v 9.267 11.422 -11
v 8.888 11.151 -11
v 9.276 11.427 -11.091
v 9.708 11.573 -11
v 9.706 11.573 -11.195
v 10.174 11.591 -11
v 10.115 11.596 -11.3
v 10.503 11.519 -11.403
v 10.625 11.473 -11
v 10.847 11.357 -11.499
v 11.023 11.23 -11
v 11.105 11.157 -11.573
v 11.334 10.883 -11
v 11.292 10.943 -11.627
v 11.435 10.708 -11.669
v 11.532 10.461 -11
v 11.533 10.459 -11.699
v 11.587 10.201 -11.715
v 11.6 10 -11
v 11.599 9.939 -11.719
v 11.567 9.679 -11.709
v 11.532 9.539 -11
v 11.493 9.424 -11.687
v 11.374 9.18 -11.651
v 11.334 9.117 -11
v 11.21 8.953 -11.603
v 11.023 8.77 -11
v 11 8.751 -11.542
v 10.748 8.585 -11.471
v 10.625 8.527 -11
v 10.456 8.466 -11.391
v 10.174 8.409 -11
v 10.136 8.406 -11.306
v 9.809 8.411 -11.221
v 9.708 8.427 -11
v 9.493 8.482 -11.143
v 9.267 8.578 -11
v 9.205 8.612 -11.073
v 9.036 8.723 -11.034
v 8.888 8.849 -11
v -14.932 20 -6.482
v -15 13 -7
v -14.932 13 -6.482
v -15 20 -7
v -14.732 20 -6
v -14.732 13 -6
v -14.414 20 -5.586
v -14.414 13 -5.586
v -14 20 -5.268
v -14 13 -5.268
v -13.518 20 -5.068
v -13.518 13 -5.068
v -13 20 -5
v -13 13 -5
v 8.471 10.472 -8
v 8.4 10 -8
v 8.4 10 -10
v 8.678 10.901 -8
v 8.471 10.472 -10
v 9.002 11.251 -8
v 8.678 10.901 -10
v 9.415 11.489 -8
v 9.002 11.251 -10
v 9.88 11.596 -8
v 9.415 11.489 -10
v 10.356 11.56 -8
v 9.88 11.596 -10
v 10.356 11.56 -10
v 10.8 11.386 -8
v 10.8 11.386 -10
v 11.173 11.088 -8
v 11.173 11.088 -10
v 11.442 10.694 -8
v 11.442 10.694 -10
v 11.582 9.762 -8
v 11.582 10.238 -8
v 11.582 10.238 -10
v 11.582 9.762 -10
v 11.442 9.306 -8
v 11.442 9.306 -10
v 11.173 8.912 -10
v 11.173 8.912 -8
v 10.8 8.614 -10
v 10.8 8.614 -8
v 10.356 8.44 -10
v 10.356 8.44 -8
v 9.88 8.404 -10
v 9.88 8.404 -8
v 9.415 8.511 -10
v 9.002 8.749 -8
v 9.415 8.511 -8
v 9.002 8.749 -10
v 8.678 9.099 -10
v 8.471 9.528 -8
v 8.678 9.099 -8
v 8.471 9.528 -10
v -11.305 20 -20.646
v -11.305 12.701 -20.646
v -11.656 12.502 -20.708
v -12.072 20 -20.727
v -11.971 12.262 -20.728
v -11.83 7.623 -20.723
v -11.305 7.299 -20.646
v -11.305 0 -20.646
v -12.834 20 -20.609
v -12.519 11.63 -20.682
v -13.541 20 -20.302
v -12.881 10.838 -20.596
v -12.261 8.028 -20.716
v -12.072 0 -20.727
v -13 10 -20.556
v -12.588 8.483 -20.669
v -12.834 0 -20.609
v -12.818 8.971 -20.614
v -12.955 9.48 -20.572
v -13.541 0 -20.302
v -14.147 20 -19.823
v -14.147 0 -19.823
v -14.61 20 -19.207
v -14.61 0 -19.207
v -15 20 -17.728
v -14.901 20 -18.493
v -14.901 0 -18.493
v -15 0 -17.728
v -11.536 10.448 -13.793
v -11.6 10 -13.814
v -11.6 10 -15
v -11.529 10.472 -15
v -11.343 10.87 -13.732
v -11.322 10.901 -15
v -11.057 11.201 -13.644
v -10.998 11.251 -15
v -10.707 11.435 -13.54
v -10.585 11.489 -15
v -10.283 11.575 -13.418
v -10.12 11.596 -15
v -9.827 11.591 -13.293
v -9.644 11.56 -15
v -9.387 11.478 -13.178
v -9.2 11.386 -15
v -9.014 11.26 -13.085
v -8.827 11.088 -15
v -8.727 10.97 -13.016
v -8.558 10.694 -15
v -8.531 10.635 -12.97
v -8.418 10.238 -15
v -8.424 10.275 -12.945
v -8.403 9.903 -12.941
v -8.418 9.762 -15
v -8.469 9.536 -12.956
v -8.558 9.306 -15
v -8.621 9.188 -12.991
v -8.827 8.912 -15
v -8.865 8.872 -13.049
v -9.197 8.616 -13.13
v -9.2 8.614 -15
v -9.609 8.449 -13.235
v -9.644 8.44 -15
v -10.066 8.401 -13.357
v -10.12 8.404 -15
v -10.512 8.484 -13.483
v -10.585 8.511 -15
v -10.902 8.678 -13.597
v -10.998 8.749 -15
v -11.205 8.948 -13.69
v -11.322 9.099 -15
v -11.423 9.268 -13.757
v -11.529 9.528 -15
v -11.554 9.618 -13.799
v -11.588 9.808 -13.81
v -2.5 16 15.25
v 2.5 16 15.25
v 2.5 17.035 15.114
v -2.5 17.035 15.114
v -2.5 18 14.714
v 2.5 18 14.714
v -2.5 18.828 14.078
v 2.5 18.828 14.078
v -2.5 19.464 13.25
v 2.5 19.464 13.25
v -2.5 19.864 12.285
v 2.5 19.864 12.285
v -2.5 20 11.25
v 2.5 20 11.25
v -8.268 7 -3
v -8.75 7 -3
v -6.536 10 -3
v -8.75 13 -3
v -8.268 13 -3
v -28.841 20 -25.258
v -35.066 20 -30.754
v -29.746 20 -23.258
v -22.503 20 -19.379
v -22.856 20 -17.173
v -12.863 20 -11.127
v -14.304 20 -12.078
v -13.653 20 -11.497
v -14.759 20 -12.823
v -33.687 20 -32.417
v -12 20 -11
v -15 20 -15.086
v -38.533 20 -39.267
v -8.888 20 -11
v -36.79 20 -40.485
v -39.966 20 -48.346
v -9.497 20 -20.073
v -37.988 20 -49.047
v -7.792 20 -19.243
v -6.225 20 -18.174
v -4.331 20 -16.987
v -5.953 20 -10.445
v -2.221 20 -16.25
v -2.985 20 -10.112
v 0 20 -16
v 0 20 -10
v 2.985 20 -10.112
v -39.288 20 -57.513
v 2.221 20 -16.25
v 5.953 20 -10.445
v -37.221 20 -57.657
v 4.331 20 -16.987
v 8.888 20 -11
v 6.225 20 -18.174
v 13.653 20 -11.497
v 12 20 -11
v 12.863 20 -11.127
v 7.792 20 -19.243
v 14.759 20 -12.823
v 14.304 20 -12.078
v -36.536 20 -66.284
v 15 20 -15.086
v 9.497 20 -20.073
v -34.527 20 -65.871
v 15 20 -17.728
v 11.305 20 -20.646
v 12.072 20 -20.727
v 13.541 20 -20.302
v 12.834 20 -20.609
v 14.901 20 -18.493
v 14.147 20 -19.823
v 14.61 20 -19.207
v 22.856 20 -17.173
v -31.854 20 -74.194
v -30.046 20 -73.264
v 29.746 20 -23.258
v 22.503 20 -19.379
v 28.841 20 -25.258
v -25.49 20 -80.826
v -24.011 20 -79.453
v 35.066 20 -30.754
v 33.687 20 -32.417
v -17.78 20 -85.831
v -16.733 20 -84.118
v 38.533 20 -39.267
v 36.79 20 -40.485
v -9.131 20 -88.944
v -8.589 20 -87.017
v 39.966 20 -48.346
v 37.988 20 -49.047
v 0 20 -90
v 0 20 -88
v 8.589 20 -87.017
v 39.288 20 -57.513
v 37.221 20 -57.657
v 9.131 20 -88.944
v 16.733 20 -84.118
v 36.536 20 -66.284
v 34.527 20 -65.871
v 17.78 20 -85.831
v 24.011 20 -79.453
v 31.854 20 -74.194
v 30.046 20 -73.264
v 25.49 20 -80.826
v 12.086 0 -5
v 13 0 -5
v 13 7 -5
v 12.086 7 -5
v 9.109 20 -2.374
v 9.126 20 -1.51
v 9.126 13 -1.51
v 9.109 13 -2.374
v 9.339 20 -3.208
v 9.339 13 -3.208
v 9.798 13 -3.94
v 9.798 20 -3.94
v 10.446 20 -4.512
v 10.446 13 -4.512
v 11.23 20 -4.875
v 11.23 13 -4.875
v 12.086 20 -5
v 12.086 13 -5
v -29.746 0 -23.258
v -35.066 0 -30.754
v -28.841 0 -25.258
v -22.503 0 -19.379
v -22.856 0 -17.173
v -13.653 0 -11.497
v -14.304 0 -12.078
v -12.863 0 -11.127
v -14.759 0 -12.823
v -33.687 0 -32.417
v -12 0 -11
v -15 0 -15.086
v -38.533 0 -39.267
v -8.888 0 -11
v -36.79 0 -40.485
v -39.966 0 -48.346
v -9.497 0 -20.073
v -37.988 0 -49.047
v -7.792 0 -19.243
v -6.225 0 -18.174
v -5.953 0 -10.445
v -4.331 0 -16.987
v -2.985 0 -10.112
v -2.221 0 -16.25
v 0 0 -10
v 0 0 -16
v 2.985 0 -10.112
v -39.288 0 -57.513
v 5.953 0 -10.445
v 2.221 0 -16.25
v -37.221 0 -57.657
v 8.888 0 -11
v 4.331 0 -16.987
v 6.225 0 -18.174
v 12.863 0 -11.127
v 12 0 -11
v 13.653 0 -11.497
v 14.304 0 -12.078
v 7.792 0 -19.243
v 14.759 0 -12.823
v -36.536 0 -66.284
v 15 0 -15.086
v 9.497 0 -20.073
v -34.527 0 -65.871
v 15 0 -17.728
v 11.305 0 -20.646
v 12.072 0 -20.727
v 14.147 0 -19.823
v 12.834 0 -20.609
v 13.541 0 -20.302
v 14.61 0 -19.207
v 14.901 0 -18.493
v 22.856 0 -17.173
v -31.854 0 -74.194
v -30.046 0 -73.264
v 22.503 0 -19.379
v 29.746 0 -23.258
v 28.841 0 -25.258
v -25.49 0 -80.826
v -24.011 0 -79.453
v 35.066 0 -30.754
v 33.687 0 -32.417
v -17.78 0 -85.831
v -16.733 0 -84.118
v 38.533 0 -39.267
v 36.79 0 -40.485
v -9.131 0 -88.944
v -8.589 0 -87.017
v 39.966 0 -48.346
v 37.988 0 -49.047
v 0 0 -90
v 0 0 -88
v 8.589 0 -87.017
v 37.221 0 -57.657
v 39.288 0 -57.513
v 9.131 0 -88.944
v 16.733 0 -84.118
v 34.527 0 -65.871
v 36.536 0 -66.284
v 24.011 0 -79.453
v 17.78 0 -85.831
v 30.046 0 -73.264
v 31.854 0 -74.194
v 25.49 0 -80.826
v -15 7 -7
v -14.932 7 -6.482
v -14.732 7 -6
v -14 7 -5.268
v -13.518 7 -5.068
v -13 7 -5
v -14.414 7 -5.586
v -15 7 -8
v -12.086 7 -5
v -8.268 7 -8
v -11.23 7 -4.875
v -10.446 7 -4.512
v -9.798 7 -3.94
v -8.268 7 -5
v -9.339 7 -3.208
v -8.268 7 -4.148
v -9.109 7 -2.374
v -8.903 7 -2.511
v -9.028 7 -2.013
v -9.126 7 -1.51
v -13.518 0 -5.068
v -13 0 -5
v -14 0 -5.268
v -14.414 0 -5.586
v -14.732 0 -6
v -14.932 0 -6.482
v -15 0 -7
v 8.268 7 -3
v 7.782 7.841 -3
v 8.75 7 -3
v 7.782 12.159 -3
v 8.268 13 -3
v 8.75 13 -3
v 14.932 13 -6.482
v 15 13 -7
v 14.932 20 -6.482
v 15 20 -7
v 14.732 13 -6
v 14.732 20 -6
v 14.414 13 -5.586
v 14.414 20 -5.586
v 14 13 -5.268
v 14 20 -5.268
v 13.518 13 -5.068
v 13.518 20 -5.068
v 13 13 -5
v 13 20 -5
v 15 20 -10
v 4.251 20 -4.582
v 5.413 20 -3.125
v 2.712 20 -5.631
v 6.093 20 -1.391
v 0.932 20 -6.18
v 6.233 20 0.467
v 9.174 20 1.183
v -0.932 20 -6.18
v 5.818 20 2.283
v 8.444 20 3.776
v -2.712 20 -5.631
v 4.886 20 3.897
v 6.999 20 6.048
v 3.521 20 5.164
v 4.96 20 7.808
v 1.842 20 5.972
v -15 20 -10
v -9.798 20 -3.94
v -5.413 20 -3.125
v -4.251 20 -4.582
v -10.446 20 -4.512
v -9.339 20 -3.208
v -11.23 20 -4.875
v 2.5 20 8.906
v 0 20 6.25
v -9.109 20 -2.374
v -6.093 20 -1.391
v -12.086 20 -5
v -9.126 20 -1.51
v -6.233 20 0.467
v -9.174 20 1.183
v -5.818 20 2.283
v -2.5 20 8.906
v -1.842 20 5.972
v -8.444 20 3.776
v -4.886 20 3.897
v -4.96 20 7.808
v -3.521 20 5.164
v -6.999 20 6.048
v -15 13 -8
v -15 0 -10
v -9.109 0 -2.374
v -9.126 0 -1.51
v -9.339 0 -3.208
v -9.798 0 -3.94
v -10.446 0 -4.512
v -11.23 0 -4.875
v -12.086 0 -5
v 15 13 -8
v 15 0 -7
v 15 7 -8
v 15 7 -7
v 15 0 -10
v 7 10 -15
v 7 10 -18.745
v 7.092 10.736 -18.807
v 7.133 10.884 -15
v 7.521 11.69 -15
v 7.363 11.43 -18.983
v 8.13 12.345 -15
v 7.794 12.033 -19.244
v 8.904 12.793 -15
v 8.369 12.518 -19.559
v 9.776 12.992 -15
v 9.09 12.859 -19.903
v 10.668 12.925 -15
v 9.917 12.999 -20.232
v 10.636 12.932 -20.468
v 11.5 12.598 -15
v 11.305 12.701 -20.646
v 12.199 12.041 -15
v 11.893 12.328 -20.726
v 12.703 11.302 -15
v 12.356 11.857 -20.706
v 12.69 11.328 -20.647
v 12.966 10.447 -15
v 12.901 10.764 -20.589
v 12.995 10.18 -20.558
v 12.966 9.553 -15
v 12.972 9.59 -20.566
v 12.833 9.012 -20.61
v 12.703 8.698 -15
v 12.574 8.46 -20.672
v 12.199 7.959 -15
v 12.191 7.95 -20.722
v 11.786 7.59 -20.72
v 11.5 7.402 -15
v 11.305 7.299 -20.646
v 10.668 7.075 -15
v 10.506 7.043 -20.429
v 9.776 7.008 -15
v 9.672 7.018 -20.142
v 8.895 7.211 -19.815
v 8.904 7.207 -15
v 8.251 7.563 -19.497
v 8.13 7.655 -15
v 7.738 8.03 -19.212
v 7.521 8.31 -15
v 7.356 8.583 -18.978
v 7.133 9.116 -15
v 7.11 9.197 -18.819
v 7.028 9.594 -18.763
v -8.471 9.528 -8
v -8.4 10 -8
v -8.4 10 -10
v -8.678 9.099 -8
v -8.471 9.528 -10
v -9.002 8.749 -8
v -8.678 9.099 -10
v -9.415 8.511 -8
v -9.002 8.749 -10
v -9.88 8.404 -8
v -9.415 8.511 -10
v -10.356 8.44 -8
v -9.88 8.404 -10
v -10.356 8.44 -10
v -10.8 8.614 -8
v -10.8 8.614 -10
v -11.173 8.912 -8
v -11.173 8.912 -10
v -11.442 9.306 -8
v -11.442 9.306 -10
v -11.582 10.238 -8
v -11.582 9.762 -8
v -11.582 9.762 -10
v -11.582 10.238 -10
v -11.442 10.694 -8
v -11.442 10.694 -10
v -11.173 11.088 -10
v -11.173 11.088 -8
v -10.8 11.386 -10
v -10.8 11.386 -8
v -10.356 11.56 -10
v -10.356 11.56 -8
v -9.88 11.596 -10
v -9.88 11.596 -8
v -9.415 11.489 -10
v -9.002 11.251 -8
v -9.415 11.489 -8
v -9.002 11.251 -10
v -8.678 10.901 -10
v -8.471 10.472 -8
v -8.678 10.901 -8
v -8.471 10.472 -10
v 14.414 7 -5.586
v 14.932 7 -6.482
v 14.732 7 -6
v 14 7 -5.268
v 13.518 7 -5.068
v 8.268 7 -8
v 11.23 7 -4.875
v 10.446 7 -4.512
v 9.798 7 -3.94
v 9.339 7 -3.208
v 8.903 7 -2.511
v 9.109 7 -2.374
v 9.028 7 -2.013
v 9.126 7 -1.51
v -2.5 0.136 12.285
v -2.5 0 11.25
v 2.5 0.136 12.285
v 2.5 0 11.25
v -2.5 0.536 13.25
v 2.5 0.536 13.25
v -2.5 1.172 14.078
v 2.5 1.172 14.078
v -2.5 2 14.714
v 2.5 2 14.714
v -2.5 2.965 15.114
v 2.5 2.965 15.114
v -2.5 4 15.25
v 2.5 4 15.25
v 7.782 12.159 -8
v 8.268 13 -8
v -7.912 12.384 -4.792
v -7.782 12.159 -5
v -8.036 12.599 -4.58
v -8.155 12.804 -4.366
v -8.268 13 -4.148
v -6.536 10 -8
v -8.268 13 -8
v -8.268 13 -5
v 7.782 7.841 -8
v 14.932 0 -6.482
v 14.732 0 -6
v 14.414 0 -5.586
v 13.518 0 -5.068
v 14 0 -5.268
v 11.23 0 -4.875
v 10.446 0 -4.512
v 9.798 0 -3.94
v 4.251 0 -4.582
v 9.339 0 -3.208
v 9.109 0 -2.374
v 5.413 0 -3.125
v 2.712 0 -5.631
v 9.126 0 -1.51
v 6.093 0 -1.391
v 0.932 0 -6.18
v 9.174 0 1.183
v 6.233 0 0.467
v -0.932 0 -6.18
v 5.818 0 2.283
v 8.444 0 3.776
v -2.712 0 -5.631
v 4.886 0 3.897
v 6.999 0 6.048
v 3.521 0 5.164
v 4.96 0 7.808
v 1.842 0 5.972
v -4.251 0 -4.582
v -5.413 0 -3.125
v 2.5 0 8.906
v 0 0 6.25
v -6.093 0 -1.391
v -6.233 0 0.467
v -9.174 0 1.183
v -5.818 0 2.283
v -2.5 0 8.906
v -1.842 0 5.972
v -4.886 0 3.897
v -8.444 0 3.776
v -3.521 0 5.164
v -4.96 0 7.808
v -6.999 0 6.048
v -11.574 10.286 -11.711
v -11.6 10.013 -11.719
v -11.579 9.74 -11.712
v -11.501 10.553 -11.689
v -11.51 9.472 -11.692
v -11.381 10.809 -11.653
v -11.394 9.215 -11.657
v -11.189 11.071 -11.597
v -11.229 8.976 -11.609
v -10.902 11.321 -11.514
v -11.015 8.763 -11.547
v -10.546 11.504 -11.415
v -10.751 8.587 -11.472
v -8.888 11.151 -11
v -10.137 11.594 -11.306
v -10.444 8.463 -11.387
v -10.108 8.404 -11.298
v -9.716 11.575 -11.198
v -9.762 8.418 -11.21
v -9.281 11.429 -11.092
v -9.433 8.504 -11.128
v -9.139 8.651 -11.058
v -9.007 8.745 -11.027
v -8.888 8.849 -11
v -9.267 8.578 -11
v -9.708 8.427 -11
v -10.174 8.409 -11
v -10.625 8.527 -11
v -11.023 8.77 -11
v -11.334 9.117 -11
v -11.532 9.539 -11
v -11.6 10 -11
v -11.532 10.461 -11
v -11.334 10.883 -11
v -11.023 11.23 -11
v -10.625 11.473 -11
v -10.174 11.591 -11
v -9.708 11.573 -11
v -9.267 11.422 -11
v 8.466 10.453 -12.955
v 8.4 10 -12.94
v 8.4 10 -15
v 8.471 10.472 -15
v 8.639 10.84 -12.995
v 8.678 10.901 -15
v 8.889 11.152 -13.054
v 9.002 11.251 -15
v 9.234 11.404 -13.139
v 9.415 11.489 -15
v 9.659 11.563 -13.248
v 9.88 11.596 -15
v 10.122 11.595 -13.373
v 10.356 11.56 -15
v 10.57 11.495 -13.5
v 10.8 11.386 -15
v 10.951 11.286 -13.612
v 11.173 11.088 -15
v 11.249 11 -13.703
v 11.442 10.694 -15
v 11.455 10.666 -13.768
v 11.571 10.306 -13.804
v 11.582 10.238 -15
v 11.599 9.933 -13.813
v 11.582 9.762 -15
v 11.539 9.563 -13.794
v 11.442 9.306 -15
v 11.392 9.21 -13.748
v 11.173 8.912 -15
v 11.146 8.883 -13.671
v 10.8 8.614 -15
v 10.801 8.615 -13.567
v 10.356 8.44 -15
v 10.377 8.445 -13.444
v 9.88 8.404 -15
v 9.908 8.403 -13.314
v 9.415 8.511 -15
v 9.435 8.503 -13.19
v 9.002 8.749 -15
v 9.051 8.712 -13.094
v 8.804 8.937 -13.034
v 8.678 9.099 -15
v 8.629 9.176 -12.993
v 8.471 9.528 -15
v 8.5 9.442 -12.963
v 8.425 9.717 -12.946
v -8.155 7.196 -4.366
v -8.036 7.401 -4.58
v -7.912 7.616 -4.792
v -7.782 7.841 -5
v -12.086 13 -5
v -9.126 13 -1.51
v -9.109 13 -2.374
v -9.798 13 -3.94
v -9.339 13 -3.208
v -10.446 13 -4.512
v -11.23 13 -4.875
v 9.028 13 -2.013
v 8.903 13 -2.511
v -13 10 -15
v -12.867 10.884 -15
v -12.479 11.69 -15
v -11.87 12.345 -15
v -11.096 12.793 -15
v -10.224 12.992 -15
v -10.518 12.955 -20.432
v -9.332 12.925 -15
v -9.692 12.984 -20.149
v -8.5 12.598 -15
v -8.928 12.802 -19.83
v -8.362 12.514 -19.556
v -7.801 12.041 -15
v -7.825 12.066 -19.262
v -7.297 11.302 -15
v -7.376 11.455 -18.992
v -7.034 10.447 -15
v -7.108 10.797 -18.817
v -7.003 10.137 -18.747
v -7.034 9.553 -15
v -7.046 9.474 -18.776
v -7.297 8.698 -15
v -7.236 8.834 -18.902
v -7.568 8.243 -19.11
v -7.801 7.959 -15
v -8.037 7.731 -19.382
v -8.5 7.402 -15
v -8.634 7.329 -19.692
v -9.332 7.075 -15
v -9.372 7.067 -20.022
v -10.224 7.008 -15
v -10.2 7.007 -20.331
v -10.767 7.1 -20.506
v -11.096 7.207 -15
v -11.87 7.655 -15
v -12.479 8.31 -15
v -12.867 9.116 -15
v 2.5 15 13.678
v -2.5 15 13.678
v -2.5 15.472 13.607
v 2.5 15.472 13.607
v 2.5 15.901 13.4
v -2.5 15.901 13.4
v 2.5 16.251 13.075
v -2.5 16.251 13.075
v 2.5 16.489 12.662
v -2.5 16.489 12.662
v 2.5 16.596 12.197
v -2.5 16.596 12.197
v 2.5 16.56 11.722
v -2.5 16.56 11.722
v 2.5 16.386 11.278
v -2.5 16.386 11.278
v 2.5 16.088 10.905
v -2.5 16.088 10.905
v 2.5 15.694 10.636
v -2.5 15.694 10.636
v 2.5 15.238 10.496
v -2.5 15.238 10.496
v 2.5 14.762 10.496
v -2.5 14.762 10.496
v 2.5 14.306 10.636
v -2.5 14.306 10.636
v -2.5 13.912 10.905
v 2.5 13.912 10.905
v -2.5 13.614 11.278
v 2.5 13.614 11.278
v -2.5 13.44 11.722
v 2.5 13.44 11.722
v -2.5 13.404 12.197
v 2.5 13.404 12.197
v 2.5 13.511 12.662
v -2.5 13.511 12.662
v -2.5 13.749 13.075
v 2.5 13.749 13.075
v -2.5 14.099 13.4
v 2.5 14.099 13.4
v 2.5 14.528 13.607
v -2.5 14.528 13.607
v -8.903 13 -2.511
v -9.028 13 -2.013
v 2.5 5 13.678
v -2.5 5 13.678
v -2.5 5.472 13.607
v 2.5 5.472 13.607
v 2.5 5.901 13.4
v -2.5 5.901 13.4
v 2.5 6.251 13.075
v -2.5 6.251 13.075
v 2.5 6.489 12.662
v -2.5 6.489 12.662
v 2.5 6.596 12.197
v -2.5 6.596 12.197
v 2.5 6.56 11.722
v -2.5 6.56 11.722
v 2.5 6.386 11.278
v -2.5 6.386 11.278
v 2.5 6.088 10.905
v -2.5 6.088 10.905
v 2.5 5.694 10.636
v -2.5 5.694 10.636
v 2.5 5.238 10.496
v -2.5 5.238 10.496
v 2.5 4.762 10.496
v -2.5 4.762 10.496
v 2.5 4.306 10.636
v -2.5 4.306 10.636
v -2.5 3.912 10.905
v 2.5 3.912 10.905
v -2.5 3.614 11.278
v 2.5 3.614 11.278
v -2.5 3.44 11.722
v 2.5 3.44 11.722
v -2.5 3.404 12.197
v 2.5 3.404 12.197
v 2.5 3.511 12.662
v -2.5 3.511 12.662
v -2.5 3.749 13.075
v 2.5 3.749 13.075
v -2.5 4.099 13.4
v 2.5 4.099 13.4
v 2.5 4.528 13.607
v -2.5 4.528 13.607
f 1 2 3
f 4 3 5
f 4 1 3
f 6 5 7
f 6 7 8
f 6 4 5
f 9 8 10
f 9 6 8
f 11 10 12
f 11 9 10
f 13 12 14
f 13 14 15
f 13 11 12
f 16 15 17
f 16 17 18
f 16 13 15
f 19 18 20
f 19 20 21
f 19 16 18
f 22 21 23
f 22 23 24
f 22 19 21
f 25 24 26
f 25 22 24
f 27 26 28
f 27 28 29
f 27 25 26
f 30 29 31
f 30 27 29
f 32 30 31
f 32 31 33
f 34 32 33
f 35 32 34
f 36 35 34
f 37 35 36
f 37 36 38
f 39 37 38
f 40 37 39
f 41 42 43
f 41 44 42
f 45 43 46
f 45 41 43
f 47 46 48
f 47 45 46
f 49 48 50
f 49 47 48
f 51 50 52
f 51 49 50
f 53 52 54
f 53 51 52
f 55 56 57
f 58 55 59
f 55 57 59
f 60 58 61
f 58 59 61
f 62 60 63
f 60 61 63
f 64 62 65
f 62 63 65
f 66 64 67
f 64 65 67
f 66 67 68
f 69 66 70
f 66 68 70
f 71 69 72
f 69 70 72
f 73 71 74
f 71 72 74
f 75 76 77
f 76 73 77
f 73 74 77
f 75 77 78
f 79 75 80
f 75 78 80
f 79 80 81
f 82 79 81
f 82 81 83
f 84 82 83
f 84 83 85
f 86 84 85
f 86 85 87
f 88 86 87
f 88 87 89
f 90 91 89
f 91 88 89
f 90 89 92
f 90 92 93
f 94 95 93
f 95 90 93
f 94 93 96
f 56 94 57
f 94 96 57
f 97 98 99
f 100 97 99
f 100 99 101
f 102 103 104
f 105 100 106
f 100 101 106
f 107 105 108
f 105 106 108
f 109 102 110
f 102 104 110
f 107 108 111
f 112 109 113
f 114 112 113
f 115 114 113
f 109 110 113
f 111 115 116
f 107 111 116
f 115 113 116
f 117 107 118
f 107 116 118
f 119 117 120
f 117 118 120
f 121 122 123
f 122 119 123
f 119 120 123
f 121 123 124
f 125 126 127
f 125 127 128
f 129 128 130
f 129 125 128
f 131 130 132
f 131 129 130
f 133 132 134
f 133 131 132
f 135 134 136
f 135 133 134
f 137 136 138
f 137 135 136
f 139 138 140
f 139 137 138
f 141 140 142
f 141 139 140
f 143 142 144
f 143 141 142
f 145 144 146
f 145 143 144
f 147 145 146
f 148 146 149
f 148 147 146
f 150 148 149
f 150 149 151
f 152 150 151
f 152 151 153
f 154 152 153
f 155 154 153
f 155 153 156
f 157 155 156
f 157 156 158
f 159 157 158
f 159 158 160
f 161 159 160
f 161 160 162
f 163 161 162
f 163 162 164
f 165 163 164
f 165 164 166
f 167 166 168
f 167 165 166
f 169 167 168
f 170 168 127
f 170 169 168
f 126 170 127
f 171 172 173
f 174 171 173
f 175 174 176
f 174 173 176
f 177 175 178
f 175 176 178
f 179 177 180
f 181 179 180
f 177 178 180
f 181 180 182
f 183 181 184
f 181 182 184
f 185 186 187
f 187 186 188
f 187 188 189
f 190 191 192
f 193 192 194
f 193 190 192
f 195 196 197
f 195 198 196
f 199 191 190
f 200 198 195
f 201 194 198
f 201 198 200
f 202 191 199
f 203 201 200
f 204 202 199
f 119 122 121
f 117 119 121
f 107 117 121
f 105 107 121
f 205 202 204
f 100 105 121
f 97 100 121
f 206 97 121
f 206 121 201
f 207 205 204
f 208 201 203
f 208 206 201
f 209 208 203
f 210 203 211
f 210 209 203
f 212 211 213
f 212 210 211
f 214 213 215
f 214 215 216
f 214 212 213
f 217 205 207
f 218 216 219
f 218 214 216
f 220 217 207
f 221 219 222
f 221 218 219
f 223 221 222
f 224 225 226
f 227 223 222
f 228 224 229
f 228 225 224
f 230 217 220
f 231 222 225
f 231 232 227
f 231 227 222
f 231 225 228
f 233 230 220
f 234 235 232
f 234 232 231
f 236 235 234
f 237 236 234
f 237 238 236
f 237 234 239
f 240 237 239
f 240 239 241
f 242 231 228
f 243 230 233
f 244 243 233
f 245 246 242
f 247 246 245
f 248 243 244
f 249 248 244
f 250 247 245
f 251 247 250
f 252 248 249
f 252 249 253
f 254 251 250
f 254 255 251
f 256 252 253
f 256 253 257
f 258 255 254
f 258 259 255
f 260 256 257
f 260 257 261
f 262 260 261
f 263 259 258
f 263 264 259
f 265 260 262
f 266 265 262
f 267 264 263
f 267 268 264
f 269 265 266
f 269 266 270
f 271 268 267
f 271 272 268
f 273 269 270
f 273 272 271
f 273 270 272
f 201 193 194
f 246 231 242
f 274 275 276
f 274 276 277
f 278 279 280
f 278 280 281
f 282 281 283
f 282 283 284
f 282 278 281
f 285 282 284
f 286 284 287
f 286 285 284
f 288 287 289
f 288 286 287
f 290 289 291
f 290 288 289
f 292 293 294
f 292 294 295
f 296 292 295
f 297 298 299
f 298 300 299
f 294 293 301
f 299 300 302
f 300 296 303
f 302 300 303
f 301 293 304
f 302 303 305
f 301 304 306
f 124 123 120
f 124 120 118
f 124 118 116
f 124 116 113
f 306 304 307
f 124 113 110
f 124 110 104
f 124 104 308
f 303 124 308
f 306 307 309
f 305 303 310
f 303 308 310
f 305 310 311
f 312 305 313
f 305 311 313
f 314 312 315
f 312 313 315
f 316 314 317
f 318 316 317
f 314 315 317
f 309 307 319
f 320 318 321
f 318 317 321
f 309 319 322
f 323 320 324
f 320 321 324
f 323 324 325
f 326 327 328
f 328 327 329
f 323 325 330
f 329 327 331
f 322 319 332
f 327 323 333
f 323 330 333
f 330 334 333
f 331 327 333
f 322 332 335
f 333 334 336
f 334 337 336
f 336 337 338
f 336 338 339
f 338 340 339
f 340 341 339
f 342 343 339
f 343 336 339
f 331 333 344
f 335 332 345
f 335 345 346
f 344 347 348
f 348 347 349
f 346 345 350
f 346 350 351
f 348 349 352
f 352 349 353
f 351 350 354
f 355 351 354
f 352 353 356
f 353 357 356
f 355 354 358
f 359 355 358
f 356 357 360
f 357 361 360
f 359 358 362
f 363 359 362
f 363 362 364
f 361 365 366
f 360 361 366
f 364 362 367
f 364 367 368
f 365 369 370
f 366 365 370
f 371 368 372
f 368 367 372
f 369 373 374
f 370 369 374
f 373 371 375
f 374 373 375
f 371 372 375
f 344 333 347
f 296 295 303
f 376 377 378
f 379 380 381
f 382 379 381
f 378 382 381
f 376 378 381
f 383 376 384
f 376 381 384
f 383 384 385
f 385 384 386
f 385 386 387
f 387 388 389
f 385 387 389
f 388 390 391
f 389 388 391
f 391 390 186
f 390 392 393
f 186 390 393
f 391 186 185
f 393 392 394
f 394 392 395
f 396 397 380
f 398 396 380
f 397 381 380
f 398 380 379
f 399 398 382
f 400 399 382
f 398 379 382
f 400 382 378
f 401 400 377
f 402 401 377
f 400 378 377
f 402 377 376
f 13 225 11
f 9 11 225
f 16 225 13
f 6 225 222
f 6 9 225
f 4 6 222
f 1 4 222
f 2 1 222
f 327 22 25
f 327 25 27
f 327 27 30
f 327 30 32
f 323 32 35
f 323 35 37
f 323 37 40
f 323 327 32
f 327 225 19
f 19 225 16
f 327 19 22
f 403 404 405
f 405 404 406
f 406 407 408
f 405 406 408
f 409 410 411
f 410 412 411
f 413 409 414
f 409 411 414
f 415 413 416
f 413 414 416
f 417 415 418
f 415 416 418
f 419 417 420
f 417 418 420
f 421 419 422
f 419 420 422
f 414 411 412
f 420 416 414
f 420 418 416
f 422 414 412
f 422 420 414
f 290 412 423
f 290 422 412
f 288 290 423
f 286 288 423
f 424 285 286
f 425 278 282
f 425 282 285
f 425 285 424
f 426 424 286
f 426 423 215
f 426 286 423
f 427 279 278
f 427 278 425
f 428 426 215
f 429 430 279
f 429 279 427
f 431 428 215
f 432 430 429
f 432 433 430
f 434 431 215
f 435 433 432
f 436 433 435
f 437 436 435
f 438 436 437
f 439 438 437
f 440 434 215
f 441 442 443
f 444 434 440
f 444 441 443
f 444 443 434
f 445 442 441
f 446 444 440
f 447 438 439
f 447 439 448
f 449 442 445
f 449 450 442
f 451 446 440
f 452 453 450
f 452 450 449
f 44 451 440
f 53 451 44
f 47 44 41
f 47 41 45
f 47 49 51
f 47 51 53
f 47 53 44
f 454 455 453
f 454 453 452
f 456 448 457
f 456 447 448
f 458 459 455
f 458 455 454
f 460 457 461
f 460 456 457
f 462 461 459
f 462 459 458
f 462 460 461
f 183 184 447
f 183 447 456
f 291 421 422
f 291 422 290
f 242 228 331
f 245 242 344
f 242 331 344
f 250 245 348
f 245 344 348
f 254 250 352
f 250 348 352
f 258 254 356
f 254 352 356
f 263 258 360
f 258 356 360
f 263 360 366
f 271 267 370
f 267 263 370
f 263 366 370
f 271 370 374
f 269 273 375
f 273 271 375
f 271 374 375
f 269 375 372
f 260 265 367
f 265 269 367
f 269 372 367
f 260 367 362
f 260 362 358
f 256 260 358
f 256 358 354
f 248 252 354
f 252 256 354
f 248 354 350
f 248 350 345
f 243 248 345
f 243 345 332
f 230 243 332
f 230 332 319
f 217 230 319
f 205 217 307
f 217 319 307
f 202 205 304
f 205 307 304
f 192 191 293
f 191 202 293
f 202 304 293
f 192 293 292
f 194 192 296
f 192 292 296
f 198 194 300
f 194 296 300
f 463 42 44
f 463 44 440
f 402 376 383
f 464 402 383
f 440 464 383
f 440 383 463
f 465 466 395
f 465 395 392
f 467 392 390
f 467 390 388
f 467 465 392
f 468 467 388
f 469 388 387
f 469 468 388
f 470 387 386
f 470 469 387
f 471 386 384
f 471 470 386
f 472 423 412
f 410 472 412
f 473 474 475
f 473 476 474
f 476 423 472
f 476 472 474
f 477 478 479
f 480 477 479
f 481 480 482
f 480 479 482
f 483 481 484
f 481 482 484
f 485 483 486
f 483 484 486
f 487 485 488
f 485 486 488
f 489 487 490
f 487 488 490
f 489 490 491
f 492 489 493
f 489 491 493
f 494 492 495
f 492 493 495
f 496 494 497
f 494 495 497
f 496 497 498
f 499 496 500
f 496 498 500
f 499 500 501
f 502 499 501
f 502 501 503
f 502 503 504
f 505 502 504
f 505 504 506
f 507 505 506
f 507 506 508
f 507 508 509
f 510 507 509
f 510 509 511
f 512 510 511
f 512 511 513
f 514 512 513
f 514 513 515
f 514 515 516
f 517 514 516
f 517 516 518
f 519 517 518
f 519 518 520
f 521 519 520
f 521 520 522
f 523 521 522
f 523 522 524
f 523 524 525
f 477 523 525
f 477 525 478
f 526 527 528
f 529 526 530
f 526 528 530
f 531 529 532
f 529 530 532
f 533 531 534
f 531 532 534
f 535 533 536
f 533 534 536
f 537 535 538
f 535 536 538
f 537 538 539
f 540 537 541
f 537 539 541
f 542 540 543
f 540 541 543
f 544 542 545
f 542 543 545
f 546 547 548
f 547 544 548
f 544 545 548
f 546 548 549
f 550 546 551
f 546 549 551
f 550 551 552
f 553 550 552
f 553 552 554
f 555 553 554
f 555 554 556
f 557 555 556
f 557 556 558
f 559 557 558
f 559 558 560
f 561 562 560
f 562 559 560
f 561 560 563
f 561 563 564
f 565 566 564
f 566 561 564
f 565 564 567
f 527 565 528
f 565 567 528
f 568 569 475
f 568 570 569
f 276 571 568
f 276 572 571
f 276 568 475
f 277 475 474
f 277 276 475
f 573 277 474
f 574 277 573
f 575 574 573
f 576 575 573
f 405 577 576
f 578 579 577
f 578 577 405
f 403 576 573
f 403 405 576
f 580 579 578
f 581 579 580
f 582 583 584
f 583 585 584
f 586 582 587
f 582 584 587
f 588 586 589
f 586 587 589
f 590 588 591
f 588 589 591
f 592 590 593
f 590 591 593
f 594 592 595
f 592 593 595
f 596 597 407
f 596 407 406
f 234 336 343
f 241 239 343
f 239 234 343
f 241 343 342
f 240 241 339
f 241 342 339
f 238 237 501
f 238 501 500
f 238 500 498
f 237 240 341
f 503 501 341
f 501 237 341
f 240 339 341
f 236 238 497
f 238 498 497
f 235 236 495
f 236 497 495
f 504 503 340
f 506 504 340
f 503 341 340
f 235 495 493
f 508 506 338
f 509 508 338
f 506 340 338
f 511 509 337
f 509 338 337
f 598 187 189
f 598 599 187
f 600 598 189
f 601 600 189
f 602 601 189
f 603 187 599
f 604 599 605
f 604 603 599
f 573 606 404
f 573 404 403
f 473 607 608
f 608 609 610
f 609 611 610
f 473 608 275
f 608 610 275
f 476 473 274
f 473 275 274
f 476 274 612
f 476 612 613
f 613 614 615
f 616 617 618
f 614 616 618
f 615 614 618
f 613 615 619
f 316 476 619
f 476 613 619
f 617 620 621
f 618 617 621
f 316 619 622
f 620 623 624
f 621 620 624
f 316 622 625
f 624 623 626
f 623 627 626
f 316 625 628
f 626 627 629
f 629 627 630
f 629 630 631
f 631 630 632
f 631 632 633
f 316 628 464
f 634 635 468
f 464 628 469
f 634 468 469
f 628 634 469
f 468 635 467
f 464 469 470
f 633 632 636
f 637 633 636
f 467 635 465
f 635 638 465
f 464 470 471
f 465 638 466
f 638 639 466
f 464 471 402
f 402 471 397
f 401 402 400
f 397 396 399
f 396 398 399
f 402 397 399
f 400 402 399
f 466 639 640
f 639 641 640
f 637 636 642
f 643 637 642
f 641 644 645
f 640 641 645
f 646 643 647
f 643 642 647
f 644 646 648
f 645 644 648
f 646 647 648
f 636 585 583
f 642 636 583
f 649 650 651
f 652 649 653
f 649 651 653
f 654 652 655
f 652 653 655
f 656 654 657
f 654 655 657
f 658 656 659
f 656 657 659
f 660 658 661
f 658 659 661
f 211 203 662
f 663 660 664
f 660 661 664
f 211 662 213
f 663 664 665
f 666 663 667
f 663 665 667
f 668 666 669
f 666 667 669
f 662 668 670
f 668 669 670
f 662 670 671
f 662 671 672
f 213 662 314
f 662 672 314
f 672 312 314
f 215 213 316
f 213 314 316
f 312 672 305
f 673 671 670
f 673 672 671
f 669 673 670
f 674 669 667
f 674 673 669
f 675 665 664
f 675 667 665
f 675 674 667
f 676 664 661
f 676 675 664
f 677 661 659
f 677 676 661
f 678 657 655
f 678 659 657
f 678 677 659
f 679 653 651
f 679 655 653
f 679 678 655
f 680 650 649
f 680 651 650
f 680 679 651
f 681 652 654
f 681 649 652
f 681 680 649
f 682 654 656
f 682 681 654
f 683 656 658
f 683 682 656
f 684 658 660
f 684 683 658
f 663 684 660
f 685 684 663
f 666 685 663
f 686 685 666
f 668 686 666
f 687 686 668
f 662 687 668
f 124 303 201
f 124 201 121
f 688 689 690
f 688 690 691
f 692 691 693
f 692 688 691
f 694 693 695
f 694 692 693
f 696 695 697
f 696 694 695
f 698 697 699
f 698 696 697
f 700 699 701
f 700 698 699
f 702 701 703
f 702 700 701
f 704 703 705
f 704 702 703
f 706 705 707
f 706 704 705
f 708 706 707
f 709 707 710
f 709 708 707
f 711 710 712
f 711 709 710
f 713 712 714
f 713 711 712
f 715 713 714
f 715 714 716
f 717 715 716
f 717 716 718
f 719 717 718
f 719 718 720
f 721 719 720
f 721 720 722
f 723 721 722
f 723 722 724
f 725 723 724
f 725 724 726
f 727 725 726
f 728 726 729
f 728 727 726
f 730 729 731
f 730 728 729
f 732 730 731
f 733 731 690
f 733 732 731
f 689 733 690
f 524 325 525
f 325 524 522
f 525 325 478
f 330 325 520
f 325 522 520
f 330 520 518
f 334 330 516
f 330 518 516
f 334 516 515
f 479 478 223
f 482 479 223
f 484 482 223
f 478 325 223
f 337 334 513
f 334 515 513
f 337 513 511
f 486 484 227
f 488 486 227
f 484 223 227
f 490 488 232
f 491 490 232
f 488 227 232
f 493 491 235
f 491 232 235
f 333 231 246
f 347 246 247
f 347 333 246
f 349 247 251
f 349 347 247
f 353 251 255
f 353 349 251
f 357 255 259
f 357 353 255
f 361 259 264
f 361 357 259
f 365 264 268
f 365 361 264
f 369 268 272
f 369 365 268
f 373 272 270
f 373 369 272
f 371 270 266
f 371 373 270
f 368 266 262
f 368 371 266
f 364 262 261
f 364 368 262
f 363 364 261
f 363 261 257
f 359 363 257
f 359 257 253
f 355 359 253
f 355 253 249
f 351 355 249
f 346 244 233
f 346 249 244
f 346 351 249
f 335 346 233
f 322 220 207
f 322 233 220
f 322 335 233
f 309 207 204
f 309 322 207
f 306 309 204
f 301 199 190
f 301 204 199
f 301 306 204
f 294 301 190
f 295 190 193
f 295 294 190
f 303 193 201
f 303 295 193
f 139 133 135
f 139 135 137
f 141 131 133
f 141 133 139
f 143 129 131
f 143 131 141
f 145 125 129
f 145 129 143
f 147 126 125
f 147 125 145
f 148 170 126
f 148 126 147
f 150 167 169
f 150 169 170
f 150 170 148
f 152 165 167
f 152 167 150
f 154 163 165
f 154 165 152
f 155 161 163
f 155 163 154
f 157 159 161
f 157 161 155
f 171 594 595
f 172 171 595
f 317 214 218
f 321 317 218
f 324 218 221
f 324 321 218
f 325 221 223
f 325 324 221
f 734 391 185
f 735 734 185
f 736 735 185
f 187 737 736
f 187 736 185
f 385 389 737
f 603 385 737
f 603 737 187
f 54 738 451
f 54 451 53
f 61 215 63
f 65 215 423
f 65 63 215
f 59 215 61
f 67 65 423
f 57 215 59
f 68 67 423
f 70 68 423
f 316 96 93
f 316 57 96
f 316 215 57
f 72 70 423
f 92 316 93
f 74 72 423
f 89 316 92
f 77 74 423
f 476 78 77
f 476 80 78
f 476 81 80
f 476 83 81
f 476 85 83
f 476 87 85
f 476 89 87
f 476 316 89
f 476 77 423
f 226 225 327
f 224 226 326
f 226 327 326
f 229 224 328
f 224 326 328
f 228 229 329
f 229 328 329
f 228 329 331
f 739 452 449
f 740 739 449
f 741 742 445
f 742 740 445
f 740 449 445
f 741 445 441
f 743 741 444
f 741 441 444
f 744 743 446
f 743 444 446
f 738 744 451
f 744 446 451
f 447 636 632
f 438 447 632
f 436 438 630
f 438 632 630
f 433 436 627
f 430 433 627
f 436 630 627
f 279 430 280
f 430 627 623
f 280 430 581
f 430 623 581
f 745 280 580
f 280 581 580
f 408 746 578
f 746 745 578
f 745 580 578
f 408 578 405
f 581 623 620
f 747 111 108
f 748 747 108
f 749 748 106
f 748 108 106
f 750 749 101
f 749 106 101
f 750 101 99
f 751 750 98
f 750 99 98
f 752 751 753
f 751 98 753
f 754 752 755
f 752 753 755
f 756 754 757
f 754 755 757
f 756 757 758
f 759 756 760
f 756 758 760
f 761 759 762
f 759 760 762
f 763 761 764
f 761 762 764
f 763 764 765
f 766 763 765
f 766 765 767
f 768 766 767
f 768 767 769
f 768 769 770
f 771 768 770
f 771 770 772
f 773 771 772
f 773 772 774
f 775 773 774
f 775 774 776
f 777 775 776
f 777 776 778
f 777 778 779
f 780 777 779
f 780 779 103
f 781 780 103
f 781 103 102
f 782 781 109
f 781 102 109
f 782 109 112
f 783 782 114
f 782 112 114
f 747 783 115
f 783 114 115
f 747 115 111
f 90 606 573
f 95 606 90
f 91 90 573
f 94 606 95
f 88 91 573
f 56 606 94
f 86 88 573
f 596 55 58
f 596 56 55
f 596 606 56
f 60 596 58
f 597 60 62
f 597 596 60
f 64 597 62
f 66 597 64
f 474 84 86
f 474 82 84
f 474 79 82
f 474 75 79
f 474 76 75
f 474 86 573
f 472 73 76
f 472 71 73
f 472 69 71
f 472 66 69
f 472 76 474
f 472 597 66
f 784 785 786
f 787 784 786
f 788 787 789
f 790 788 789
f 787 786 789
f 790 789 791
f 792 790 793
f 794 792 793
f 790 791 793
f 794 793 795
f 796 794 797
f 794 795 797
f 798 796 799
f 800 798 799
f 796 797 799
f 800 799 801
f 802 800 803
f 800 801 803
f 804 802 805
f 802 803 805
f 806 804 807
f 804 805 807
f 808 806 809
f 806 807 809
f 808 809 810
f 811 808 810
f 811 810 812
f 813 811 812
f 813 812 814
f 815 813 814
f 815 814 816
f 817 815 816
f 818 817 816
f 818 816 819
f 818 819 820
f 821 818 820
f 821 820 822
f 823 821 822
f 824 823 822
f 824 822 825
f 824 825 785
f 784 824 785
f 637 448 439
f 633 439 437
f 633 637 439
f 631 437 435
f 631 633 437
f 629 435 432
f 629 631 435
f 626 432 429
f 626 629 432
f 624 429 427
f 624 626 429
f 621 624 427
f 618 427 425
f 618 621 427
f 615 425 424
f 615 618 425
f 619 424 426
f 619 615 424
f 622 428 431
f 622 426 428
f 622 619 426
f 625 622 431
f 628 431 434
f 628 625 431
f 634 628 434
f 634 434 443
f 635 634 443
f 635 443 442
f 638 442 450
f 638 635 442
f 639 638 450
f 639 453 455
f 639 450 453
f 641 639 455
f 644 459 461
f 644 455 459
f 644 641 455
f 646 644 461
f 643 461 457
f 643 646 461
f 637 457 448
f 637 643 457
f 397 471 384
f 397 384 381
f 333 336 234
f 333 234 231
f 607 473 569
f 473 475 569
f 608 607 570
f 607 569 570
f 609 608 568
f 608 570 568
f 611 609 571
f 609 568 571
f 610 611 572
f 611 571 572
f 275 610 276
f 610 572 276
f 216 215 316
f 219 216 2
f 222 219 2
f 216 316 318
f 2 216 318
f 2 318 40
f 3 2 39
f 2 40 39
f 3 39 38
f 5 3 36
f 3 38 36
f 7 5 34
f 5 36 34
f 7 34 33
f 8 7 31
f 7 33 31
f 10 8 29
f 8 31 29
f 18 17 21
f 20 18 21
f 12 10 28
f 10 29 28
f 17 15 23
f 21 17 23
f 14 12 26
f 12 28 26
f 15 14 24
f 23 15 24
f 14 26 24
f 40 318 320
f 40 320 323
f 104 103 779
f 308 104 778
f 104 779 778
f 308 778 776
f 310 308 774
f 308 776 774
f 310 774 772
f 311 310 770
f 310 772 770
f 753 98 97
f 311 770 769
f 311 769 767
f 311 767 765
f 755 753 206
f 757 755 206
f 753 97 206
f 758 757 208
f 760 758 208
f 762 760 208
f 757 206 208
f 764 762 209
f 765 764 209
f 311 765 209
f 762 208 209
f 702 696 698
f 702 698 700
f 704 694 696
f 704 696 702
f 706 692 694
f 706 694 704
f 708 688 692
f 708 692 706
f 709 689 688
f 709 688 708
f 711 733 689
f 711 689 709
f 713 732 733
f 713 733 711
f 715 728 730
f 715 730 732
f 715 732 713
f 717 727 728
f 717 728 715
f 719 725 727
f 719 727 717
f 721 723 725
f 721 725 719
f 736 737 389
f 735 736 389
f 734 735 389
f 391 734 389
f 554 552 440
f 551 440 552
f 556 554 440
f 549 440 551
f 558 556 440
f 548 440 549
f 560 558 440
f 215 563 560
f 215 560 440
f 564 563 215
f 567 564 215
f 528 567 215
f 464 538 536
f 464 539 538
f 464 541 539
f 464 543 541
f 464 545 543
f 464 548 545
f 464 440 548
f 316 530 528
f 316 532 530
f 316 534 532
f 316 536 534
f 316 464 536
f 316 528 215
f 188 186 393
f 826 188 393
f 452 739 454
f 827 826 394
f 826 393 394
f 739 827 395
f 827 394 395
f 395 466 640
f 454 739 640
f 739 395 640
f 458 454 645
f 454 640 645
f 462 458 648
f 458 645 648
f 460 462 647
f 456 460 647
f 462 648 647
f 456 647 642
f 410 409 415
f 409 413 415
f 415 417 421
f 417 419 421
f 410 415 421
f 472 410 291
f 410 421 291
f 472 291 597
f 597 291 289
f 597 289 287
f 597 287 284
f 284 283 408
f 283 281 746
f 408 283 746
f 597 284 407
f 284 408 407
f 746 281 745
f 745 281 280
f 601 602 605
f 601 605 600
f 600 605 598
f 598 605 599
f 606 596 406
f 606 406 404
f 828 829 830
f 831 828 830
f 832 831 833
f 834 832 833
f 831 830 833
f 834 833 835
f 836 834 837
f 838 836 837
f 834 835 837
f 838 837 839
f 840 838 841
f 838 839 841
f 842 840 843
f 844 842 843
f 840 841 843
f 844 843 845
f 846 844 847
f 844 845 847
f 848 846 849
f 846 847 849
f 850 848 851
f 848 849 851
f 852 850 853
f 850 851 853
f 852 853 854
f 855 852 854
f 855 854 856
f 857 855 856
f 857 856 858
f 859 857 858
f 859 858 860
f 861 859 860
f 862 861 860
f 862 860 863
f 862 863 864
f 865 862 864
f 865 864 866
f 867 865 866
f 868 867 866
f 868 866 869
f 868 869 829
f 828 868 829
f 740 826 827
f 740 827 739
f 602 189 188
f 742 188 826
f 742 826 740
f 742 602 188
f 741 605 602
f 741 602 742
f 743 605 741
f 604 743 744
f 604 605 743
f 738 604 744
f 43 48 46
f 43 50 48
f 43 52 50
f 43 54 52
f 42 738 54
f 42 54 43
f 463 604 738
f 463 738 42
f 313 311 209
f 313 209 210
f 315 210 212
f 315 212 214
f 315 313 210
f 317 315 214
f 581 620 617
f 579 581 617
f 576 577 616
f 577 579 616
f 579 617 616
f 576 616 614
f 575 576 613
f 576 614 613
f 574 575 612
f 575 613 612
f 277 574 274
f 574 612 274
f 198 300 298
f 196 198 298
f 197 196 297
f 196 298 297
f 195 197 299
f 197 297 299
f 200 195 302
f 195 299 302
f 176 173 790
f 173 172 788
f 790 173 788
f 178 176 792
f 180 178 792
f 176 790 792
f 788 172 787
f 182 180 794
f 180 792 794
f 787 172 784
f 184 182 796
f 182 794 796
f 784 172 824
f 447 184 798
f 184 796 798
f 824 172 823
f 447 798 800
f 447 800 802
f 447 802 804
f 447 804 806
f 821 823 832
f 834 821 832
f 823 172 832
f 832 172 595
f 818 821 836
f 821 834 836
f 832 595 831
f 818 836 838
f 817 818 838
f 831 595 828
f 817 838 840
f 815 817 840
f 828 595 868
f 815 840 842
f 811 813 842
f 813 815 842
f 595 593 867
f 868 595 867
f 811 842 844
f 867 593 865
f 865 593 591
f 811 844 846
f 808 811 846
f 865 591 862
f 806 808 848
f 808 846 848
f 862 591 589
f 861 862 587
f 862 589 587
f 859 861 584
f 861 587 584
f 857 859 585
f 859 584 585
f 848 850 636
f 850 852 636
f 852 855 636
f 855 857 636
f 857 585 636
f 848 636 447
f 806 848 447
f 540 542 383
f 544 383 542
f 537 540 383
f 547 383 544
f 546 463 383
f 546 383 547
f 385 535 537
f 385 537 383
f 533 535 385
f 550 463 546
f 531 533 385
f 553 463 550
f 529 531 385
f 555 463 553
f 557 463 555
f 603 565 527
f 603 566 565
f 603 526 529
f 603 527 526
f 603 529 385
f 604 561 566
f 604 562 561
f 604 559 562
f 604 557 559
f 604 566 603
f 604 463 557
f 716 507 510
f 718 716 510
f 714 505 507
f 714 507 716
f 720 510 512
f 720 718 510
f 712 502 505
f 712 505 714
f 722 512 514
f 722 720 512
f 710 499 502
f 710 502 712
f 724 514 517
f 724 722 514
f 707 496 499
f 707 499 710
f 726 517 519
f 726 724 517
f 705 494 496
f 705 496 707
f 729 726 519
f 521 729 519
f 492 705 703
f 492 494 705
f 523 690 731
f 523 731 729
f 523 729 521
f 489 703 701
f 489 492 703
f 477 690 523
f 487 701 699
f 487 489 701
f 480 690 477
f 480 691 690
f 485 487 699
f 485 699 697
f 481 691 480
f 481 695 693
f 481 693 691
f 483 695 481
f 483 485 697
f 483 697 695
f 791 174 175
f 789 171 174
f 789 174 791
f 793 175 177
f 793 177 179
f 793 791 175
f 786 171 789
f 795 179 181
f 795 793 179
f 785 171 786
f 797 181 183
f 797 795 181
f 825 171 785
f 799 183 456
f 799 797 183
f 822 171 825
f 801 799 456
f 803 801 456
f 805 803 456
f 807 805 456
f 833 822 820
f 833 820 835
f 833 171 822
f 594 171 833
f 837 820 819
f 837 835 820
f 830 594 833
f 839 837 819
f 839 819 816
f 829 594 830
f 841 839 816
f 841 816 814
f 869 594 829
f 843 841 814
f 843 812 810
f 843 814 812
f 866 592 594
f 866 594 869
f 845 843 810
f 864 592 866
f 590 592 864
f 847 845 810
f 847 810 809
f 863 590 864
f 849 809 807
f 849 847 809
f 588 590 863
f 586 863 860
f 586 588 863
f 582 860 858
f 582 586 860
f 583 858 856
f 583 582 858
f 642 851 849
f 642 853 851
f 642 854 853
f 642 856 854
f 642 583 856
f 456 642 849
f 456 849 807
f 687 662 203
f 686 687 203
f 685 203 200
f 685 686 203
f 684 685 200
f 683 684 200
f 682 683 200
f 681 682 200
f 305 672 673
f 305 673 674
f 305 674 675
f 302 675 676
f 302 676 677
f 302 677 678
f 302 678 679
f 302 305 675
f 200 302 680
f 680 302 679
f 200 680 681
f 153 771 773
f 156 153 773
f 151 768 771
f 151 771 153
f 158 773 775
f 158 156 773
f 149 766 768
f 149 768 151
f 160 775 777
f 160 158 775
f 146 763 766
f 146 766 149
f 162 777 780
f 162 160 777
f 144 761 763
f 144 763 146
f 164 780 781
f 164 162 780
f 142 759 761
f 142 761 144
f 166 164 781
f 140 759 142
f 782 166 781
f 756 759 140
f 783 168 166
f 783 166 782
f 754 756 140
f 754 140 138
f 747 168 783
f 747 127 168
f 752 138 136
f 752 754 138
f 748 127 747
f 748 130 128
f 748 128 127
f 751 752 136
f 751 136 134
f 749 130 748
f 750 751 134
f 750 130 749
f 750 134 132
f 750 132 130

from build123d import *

# Parameters (mm, degrees)
SKETCH_1_R           = 9.25
SKETCH_1_R_2         = 6.25
EXTRUDE_1_DEPTH      = 20
EXTRUDE_2_DEPTH      = 20
CUT_EXTRUDE_1_REACH  = 33.553
SKETCH_4_R           = 1.6
CUT_EXTRUDE_START    = -3
SKETCH_7_R           = 1.6
CUT_EXTRUDE_5_DEPTH  = 3
SKETCH_9_W           = 5
SKETCH_9_H           = 7
EXTRUDE_3_DEPTH      = 20
CUT_EXTRUDE_7_REACH  = 32.64
SKETCH_10_R          = 1.6
FILLET_1_R           = 4
EXTRUDE_4_DEPTH      = 7
CUT_EXTRUDE_8_DEPTH  = 5
EXTRUDE_5_DEPTH      = 1
EXTRUDE_6_DEPTH      = 20
FILLET_7_R           = 13
CUT_EXTRUDE_START_2  = -10
SKETCH_19_R          = 1.6
CUT_EXTRUDE_9_DEPTH  = 9.712728
SKETCH_20_R          = 3
CUT_EXTRUDE_10_DEPTH = 6
FILLET_4_R           = 2
FILLET_5_R           = 2
FILLET_6_R           = 3
EXTRUDE_START        = -20
SKETCH_21_R          = 40
SKETCH_21_R_2        = 38
EXTRUDE_7_DEPTH      = 20


with BuildPart() as part:
    # 草图1 → 凸台-拉伸1 (new body)
    with BuildSketch(Plane(origin=(0, 0, 0), x_dir=(1, 0, 0), z_dir=(0, 1, 0))):
        with Locations(Location((0, 0, 0), (0, 0, 270))):
            Circle(SKETCH_1_R)
        with Locations(Location((0, 0, 0), (0, 0, 270))):
            Circle(SKETCH_1_R_2, mode=Mode.SUBTRACT)
    extrude(amount=EXTRUDE_1_DEPTH)

    # 草图3 → 凸台-拉伸2 (add)
    with BuildSketch(Plane.XZ):
        with BuildLine():
            Line((-15, -10), (15, -10))
            Line((15, -10), (15, -5))
            Line((15, -5), (3.75, -5))
            ThreePointArc((3.75, -5), (0, -6.25), (-3.75, -5))
            Line((-3.75, -5), (-15, -5))
            Line((-15, -5), (-15, -10))
        make_face()
    extrude(amount=-EXTRUDE_2_DEPTH)

    # 草图4 → 切除-拉伸1 (cut, up to next)
    with BuildSketch(Plane(origin=(0, 0, -10), x_dir=(-1, 0, 0), z_dir=(0, 0, -1)), mode=Mode.PRIVATE) as cut_extrude_1_sk1:
        with Locations((-10, 10)):
            Circle(SKETCH_4_R)
    cut_extrude_1_tool1 = extrude(cut_extrude_1_sk1.sketch, amount=-CUT_EXTRUDE_1_REACH, mode=Mode.PRIVATE) & part.part
    # 草图4 → 切除-拉伸1 (cut, up to next)
    with BuildSketch(Plane(origin=(0, 0, -10), x_dir=(-1, 0, 0), z_dir=(0, 0, -1)), mode=Mode.PRIVATE) as cut_extrude_1_sk2:
        with Locations(Location((10, 10, 0), (0, 0, 180))):
            Circle(SKETCH_4_R)
    cut_extrude_1_tool2 = extrude(cut_extrude_1_sk2.sketch, amount=-CUT_EXTRUDE_1_REACH, mode=Mode.PRIVATE) & part.part
    add(cut_extrude_1_tool1.solids().sort_by_distance((10, 10, -10))[0], mode=Mode.SUBTRACT)
    add(cut_extrude_1_tool2.solids().sort_by_distance((-10, 10, -10))[0], mode=Mode.SUBTRACT)

    # 草图7 → 切除-拉伸5 (cut)
    # profile 1 of 2: a face of its own
    with BuildSketch(Plane.XY.offset(-5).offset(CUT_EXTRUDE_START)):
        Polygon((-15, 7), (-8.267949192, 7), (-6.535898385, 10), (-8.267949192, 13), (-15, 13), align=None)
        with Locations((-10, 10)):
            Circle(SKETCH_7_R, mode=Mode.SUBTRACT)
    # profile 2 of 2: a face of its own
    with BuildSketch(Plane.XY.offset(-5).offset(CUT_EXTRUDE_START)):
        Polygon((15, 13), (8.267949192, 13), (7.782191208, 12.158642491), (7.782191208, 7.841357509), (8.267949192, 7), (15, 7), align=None)
        with Locations(Location((10, 10, 0), (0, 0, 180))):
            Circle(SKETCH_7_R, mode=Mode.SUBTRACT)
    extrude(amount=CUT_EXTRUDE_5_DEPTH, mode=Mode.SUBTRACT)

    # 草图9 → 凸台-拉伸3 (add)
    with BuildSketch(Plane(origin=(0, 0, 0), x_dir=(1, 0, 0), z_dir=(0, 1, 0))):
        with Locations((0, -11.75)):
            Rectangle(SKETCH_9_W, SKETCH_9_H)
    extrude(amount=EXTRUDE_3_DEPTH)

    # 草图10 → 切除-拉伸7 (cut, up to next)
    with BuildSketch(Plane.ZY.offset(2.5), mode=Mode.PRIVATE) as cut_extrude_7_sk1:
        with Locations((12.077878283, 15)):
            Circle(SKETCH_10_R)
    cut_extrude_7_tool1 = extrude(cut_extrude_7_sk1.sketch, amount=-CUT_EXTRUDE_7_REACH, mode=Mode.PRIVATE) & part.part
    # 草图10 → 切除-拉伸7 (cut, up to next)
    with BuildSketch(Plane.ZY.offset(2.5), mode=Mode.PRIVATE) as cut_extrude_7_sk2:
        with Locations((12.077878283, 5)):
            Circle(SKETCH_10_R)
    cut_extrude_7_tool2 = extrude(cut_extrude_7_sk2.sketch, amount=-CUT_EXTRUDE_7_REACH, mode=Mode.PRIVATE) & part.part
    add(cut_extrude_7_tool1.solids().sort_by_distance((-2.5, 15, 12.077878))[0], mode=Mode.SUBTRACT)
    add(cut_extrude_7_tool2.solids().sort_by_distance((-2.5, 5, 12.077878))[0], mode=Mode.SUBTRACT)

    # 圆角1
    fillet_1_edges = [part.edges().sort_by_distance(p)[0] for p in [
        (0, 0, 15.25),
        (0, 20, 15.25),
    ]]
    fillet(fillet_1_edges, radius=FILLET_1_R)

    # 草图11 → 凸台-拉伸4 (add)
    with BuildSketch(Plane.XZ):
        with BuildLine():
            Line((12.085631965, -5), (7.782191208, -5))
            ThreePointArc((7.782191208, -5), (8.632232168, -3.323712952), (9.125885362, -1.510204082))
            ThreePointArc((9.125885362, -1.510204082), (9.797686626, -3.940439672), (12.085631965, -5))
        make_face()
        with BuildLine():
            Line((-12.085631965, -5), (-7.782191208, -5))
            ThreePointArc((-7.782191208, -5), (-8.632232168, -3.323712952), (-9.125885362, -1.510204082))
            ThreePointArc((-9.125885362, -1.510204082), (-9.797686626, -3.940439672), (-12.085631965, -5))
        make_face()
    extrude_4 = extrude(amount=-EXTRUDE_4_DEPTH)

    # 镜向2: 凸台-拉伸4 across plane
    add(extrude_4.mirror(Plane.ZX.offset(10)))

    # 草图16 → 切除-拉伸8 (cut)
    with BuildSketch(Plane.XY.offset(-8)):
        Polygon((8.267949192, 7), (15, 7), (15, 13), (8.267949192, 13), (7.782191208, 12.158642491), (7.782191208, 7.841357509), align=None)
        Polygon((-15, 7), (-8.267949192, 7), (-6.535898385, 10), (-8.267949192, 13), (-15, 13), align=None)
    extrude(amount=CUT_EXTRUDE_8_DEPTH, mode=Mode.SUBTRACT)

    # 草图17 → 凸台-拉伸5 (add)
    with BuildSketch(Plane.XY.offset(-5)):
        Polygon((-8.267949192, 7), (-7.782191208, 7), (-7.782191208, 7.841357509), align=None)
        Polygon((-7.782191208, 13), (-8.267949192, 13), (-7.782191208, 12.158642491), align=None)
        Polygon((7.782191208, 12.158642491), (8.267949192, 13), (7.782191208, 13), align=None)
        Polygon((7.782191208, 7.841357509), (7.782191208, 7), (8.267949192, 7), align=None)
    extrude(amount=EXTRUDE_5_DEPTH)


with BuildPart() as body_2:
    # Split Bodies 1: the piece on the far side of the plane
    add(part.part)
    split(bisect_by=Plane(origin=(0, 0, 0), x_dir=(0, 0, 1), z_dir=(1, 0, 0)), keep=Keep.BOTTOM)

    # 圆角5
    fillet_5_edges = [body_2.edges().sort_by_distance(p)[0] for p in [
        (-15, 3.5, -5),
        (-15, 16.5, -5),
    ]]
    fillet(fillet_5_edges, radius=FILLET_5_R)


with BuildPart() as part_1:
    add(part.part)

    # Split Bodies 1
    split(bisect_by=Plane(origin=(0, 0, 0), x_dir=(0, 0, 1), z_dir=(1, 0, 0)), keep=Keep.TOP)

    # 圆角4
    fillet_4_edges = [part_1.edges().sort_by_distance(p)[0] for p in [
        (15, 16.5, -5),
        (15, 3.5, -5),
    ]]
    fillet(fillet_4_edges, radius=FILLET_4_R)

    add(body_2.part)  # 凸台-拉伸7 merges body 2


with BuildPart() as body_3:
    # 草图18 → 凸台-拉伸6 (new body)
    with BuildSketch(Plane.XZ):
        with BuildLine():
            Line((0, -16), (0, -11))
            Line((0, -11), (-15, -11))
            Line((-15, -11), (-15, -21))
            Line((-15, -21), (-8.660254038, -21))
            ThreePointArc((-8.660254038, -21), (-5, -17.339745962), (0, -16))
        make_face()
        with BuildLine():
            Line((15, -11), (0, -11))
            Line((0, -11), (0, -16))
            ThreePointArc((0, -16), (5, -17.339745962), (8.660254038, -21))
            Line((8.660254038, -21), (15, -21))
            Line((15, -21), (15, -11))
        make_face()
    extrude(amount=-EXTRUDE_6_DEPTH)

    # 圆角7
    fillet_7_edges = [body_3.edges().sort_by_distance(p)[0] for p in [
        (-8.660254038, 10, -21),
        (8.660254038, 10, -21),
    ]]
    fillet(fillet_7_edges, radius=FILLET_7_R)

    # 草图19 → 切除-拉伸9 (cut)
    with BuildSketch(Plane(origin=(0, 0, -21), x_dir=(-1, 0, 0), z_dir=(0, 0, -1)).offset(CUT_EXTRUDE_START_2)):
        with Locations((10, 10)):
            Circle(SKETCH_19_R)
        with Locations((-10, 10)):
            Circle(SKETCH_19_R)
    extrude(amount=CUT_EXTRUDE_9_DEPTH, mode=Mode.SUBTRACT)

    # 草图20 → 切除-拉伸10 (cut)
    with BuildSketch(Plane(origin=(0, 0, -21), x_dir=(-1, 0, 0), z_dir=(0, 0, -1))):
        with Locations((10, 10)):
            Circle(SKETCH_20_R)
        with Locations((-10, 10)):
            Circle(SKETCH_20_R)
    extrude(amount=-CUT_EXTRUDE_10_DEPTH, mode=Mode.SUBTRACT)

    # 圆角6
    # the kernel refuses this fillet: 3 mm, written as the material it takes off along each edge
    with BuildSketch(Plane(origin=(-15, -7.5, -11), x_dir=(0, 0, -1), z_dir=(0, 1, 0)), Plane(origin=(15, -7.5, -11), x_dir=(-1, 0, 0), z_dir=(0, 1, 0))) as fillet_6_piece_1:
        with BuildLine():
            CenterArc((FILLET_6_R, -FILLET_6_R), FILLET_6_R, 90, 90)
            Line((0, -FILLET_6_R), (0, 0))
            Line((0, 0), (FILLET_6_R, 0))
        make_face()
    extrude(amount=35, mode=Mode.SUBTRACT)
    with BuildSketch(Plane(origin=(-15, -9.280663445, -21), x_dir=(0.9954423896624867, 0, 0.09536481983959225), z_dir=(0, 1, 0))) as fillet_6_piece_2:
        with BuildLine():
            CenterArc((3.298391634, -2.971314276), FILLET_6_R, 82.070303254, 103.40201453)
            Line((0.312064465, -3.257408735), (0.013431749, -3.286018181))
            Line((0.013431749, -3.286018181), (-0.298632717, -0.028609446))
            Line((-0.298632717, -0.028609446), (-0.028609446, 0.298632717))
            ThreePointArc((-0.028609446, 0.298632717), (0.650460385, 0.363688588), (3.753652752, 0.297131428))
            Line((3.753652752, 0.297131428), (3.712265378, 0))
        make_face()
    extrude(amount=38.56132689, mode=Mode.SUBTRACT)
    with BuildSketch(Plane(origin=(15, -9.280663445, -21), x_dir=(0, 0, 1), z_dir=(0, 1, 0))) as fillet_6_piece_3:
        with BuildLine():
            CenterArc((3.272322707, -3), FILLET_6_R, 90, 103.40201453)
            Line((0.354019519, -3.695346319), (0.0621892, -3.764880951))
            ThreePointArc((0.0621892, -3.764880951), (-0.3, -0.682178937), (-0.3, 0))
            Line((-0.3, 0), (0, 0.3))
            Line((0, 0.3), (3.272322707, 0.3))
            Line((3.272322707, 0.3), (3.272322707, 0))
        make_face()
    extrude(amount=38.56132689, mode=Mode.SUBTRACT)


with BuildPart() as part_2:
    add(part_1.part)

    add(body_3.part)  # 凸台-拉伸7 merges body 3
    # 草图21 → 凸台-拉伸7 (add)
    with BuildSketch(Plane(origin=(0, 20, 0), x_dir=(1, 0, 0), z_dir=(0, 1, 0)).offset(EXTRUDE_START)):
        with Locations((0, 50)):
            Circle(SKETCH_21_R)
        with Locations((0, 50)):
            Circle(SKETCH_21_R_2, mode=Mode.SUBTRACT)
    extrude(amount=EXTRUDE_7_DEPTH)


solid = part_2.part
